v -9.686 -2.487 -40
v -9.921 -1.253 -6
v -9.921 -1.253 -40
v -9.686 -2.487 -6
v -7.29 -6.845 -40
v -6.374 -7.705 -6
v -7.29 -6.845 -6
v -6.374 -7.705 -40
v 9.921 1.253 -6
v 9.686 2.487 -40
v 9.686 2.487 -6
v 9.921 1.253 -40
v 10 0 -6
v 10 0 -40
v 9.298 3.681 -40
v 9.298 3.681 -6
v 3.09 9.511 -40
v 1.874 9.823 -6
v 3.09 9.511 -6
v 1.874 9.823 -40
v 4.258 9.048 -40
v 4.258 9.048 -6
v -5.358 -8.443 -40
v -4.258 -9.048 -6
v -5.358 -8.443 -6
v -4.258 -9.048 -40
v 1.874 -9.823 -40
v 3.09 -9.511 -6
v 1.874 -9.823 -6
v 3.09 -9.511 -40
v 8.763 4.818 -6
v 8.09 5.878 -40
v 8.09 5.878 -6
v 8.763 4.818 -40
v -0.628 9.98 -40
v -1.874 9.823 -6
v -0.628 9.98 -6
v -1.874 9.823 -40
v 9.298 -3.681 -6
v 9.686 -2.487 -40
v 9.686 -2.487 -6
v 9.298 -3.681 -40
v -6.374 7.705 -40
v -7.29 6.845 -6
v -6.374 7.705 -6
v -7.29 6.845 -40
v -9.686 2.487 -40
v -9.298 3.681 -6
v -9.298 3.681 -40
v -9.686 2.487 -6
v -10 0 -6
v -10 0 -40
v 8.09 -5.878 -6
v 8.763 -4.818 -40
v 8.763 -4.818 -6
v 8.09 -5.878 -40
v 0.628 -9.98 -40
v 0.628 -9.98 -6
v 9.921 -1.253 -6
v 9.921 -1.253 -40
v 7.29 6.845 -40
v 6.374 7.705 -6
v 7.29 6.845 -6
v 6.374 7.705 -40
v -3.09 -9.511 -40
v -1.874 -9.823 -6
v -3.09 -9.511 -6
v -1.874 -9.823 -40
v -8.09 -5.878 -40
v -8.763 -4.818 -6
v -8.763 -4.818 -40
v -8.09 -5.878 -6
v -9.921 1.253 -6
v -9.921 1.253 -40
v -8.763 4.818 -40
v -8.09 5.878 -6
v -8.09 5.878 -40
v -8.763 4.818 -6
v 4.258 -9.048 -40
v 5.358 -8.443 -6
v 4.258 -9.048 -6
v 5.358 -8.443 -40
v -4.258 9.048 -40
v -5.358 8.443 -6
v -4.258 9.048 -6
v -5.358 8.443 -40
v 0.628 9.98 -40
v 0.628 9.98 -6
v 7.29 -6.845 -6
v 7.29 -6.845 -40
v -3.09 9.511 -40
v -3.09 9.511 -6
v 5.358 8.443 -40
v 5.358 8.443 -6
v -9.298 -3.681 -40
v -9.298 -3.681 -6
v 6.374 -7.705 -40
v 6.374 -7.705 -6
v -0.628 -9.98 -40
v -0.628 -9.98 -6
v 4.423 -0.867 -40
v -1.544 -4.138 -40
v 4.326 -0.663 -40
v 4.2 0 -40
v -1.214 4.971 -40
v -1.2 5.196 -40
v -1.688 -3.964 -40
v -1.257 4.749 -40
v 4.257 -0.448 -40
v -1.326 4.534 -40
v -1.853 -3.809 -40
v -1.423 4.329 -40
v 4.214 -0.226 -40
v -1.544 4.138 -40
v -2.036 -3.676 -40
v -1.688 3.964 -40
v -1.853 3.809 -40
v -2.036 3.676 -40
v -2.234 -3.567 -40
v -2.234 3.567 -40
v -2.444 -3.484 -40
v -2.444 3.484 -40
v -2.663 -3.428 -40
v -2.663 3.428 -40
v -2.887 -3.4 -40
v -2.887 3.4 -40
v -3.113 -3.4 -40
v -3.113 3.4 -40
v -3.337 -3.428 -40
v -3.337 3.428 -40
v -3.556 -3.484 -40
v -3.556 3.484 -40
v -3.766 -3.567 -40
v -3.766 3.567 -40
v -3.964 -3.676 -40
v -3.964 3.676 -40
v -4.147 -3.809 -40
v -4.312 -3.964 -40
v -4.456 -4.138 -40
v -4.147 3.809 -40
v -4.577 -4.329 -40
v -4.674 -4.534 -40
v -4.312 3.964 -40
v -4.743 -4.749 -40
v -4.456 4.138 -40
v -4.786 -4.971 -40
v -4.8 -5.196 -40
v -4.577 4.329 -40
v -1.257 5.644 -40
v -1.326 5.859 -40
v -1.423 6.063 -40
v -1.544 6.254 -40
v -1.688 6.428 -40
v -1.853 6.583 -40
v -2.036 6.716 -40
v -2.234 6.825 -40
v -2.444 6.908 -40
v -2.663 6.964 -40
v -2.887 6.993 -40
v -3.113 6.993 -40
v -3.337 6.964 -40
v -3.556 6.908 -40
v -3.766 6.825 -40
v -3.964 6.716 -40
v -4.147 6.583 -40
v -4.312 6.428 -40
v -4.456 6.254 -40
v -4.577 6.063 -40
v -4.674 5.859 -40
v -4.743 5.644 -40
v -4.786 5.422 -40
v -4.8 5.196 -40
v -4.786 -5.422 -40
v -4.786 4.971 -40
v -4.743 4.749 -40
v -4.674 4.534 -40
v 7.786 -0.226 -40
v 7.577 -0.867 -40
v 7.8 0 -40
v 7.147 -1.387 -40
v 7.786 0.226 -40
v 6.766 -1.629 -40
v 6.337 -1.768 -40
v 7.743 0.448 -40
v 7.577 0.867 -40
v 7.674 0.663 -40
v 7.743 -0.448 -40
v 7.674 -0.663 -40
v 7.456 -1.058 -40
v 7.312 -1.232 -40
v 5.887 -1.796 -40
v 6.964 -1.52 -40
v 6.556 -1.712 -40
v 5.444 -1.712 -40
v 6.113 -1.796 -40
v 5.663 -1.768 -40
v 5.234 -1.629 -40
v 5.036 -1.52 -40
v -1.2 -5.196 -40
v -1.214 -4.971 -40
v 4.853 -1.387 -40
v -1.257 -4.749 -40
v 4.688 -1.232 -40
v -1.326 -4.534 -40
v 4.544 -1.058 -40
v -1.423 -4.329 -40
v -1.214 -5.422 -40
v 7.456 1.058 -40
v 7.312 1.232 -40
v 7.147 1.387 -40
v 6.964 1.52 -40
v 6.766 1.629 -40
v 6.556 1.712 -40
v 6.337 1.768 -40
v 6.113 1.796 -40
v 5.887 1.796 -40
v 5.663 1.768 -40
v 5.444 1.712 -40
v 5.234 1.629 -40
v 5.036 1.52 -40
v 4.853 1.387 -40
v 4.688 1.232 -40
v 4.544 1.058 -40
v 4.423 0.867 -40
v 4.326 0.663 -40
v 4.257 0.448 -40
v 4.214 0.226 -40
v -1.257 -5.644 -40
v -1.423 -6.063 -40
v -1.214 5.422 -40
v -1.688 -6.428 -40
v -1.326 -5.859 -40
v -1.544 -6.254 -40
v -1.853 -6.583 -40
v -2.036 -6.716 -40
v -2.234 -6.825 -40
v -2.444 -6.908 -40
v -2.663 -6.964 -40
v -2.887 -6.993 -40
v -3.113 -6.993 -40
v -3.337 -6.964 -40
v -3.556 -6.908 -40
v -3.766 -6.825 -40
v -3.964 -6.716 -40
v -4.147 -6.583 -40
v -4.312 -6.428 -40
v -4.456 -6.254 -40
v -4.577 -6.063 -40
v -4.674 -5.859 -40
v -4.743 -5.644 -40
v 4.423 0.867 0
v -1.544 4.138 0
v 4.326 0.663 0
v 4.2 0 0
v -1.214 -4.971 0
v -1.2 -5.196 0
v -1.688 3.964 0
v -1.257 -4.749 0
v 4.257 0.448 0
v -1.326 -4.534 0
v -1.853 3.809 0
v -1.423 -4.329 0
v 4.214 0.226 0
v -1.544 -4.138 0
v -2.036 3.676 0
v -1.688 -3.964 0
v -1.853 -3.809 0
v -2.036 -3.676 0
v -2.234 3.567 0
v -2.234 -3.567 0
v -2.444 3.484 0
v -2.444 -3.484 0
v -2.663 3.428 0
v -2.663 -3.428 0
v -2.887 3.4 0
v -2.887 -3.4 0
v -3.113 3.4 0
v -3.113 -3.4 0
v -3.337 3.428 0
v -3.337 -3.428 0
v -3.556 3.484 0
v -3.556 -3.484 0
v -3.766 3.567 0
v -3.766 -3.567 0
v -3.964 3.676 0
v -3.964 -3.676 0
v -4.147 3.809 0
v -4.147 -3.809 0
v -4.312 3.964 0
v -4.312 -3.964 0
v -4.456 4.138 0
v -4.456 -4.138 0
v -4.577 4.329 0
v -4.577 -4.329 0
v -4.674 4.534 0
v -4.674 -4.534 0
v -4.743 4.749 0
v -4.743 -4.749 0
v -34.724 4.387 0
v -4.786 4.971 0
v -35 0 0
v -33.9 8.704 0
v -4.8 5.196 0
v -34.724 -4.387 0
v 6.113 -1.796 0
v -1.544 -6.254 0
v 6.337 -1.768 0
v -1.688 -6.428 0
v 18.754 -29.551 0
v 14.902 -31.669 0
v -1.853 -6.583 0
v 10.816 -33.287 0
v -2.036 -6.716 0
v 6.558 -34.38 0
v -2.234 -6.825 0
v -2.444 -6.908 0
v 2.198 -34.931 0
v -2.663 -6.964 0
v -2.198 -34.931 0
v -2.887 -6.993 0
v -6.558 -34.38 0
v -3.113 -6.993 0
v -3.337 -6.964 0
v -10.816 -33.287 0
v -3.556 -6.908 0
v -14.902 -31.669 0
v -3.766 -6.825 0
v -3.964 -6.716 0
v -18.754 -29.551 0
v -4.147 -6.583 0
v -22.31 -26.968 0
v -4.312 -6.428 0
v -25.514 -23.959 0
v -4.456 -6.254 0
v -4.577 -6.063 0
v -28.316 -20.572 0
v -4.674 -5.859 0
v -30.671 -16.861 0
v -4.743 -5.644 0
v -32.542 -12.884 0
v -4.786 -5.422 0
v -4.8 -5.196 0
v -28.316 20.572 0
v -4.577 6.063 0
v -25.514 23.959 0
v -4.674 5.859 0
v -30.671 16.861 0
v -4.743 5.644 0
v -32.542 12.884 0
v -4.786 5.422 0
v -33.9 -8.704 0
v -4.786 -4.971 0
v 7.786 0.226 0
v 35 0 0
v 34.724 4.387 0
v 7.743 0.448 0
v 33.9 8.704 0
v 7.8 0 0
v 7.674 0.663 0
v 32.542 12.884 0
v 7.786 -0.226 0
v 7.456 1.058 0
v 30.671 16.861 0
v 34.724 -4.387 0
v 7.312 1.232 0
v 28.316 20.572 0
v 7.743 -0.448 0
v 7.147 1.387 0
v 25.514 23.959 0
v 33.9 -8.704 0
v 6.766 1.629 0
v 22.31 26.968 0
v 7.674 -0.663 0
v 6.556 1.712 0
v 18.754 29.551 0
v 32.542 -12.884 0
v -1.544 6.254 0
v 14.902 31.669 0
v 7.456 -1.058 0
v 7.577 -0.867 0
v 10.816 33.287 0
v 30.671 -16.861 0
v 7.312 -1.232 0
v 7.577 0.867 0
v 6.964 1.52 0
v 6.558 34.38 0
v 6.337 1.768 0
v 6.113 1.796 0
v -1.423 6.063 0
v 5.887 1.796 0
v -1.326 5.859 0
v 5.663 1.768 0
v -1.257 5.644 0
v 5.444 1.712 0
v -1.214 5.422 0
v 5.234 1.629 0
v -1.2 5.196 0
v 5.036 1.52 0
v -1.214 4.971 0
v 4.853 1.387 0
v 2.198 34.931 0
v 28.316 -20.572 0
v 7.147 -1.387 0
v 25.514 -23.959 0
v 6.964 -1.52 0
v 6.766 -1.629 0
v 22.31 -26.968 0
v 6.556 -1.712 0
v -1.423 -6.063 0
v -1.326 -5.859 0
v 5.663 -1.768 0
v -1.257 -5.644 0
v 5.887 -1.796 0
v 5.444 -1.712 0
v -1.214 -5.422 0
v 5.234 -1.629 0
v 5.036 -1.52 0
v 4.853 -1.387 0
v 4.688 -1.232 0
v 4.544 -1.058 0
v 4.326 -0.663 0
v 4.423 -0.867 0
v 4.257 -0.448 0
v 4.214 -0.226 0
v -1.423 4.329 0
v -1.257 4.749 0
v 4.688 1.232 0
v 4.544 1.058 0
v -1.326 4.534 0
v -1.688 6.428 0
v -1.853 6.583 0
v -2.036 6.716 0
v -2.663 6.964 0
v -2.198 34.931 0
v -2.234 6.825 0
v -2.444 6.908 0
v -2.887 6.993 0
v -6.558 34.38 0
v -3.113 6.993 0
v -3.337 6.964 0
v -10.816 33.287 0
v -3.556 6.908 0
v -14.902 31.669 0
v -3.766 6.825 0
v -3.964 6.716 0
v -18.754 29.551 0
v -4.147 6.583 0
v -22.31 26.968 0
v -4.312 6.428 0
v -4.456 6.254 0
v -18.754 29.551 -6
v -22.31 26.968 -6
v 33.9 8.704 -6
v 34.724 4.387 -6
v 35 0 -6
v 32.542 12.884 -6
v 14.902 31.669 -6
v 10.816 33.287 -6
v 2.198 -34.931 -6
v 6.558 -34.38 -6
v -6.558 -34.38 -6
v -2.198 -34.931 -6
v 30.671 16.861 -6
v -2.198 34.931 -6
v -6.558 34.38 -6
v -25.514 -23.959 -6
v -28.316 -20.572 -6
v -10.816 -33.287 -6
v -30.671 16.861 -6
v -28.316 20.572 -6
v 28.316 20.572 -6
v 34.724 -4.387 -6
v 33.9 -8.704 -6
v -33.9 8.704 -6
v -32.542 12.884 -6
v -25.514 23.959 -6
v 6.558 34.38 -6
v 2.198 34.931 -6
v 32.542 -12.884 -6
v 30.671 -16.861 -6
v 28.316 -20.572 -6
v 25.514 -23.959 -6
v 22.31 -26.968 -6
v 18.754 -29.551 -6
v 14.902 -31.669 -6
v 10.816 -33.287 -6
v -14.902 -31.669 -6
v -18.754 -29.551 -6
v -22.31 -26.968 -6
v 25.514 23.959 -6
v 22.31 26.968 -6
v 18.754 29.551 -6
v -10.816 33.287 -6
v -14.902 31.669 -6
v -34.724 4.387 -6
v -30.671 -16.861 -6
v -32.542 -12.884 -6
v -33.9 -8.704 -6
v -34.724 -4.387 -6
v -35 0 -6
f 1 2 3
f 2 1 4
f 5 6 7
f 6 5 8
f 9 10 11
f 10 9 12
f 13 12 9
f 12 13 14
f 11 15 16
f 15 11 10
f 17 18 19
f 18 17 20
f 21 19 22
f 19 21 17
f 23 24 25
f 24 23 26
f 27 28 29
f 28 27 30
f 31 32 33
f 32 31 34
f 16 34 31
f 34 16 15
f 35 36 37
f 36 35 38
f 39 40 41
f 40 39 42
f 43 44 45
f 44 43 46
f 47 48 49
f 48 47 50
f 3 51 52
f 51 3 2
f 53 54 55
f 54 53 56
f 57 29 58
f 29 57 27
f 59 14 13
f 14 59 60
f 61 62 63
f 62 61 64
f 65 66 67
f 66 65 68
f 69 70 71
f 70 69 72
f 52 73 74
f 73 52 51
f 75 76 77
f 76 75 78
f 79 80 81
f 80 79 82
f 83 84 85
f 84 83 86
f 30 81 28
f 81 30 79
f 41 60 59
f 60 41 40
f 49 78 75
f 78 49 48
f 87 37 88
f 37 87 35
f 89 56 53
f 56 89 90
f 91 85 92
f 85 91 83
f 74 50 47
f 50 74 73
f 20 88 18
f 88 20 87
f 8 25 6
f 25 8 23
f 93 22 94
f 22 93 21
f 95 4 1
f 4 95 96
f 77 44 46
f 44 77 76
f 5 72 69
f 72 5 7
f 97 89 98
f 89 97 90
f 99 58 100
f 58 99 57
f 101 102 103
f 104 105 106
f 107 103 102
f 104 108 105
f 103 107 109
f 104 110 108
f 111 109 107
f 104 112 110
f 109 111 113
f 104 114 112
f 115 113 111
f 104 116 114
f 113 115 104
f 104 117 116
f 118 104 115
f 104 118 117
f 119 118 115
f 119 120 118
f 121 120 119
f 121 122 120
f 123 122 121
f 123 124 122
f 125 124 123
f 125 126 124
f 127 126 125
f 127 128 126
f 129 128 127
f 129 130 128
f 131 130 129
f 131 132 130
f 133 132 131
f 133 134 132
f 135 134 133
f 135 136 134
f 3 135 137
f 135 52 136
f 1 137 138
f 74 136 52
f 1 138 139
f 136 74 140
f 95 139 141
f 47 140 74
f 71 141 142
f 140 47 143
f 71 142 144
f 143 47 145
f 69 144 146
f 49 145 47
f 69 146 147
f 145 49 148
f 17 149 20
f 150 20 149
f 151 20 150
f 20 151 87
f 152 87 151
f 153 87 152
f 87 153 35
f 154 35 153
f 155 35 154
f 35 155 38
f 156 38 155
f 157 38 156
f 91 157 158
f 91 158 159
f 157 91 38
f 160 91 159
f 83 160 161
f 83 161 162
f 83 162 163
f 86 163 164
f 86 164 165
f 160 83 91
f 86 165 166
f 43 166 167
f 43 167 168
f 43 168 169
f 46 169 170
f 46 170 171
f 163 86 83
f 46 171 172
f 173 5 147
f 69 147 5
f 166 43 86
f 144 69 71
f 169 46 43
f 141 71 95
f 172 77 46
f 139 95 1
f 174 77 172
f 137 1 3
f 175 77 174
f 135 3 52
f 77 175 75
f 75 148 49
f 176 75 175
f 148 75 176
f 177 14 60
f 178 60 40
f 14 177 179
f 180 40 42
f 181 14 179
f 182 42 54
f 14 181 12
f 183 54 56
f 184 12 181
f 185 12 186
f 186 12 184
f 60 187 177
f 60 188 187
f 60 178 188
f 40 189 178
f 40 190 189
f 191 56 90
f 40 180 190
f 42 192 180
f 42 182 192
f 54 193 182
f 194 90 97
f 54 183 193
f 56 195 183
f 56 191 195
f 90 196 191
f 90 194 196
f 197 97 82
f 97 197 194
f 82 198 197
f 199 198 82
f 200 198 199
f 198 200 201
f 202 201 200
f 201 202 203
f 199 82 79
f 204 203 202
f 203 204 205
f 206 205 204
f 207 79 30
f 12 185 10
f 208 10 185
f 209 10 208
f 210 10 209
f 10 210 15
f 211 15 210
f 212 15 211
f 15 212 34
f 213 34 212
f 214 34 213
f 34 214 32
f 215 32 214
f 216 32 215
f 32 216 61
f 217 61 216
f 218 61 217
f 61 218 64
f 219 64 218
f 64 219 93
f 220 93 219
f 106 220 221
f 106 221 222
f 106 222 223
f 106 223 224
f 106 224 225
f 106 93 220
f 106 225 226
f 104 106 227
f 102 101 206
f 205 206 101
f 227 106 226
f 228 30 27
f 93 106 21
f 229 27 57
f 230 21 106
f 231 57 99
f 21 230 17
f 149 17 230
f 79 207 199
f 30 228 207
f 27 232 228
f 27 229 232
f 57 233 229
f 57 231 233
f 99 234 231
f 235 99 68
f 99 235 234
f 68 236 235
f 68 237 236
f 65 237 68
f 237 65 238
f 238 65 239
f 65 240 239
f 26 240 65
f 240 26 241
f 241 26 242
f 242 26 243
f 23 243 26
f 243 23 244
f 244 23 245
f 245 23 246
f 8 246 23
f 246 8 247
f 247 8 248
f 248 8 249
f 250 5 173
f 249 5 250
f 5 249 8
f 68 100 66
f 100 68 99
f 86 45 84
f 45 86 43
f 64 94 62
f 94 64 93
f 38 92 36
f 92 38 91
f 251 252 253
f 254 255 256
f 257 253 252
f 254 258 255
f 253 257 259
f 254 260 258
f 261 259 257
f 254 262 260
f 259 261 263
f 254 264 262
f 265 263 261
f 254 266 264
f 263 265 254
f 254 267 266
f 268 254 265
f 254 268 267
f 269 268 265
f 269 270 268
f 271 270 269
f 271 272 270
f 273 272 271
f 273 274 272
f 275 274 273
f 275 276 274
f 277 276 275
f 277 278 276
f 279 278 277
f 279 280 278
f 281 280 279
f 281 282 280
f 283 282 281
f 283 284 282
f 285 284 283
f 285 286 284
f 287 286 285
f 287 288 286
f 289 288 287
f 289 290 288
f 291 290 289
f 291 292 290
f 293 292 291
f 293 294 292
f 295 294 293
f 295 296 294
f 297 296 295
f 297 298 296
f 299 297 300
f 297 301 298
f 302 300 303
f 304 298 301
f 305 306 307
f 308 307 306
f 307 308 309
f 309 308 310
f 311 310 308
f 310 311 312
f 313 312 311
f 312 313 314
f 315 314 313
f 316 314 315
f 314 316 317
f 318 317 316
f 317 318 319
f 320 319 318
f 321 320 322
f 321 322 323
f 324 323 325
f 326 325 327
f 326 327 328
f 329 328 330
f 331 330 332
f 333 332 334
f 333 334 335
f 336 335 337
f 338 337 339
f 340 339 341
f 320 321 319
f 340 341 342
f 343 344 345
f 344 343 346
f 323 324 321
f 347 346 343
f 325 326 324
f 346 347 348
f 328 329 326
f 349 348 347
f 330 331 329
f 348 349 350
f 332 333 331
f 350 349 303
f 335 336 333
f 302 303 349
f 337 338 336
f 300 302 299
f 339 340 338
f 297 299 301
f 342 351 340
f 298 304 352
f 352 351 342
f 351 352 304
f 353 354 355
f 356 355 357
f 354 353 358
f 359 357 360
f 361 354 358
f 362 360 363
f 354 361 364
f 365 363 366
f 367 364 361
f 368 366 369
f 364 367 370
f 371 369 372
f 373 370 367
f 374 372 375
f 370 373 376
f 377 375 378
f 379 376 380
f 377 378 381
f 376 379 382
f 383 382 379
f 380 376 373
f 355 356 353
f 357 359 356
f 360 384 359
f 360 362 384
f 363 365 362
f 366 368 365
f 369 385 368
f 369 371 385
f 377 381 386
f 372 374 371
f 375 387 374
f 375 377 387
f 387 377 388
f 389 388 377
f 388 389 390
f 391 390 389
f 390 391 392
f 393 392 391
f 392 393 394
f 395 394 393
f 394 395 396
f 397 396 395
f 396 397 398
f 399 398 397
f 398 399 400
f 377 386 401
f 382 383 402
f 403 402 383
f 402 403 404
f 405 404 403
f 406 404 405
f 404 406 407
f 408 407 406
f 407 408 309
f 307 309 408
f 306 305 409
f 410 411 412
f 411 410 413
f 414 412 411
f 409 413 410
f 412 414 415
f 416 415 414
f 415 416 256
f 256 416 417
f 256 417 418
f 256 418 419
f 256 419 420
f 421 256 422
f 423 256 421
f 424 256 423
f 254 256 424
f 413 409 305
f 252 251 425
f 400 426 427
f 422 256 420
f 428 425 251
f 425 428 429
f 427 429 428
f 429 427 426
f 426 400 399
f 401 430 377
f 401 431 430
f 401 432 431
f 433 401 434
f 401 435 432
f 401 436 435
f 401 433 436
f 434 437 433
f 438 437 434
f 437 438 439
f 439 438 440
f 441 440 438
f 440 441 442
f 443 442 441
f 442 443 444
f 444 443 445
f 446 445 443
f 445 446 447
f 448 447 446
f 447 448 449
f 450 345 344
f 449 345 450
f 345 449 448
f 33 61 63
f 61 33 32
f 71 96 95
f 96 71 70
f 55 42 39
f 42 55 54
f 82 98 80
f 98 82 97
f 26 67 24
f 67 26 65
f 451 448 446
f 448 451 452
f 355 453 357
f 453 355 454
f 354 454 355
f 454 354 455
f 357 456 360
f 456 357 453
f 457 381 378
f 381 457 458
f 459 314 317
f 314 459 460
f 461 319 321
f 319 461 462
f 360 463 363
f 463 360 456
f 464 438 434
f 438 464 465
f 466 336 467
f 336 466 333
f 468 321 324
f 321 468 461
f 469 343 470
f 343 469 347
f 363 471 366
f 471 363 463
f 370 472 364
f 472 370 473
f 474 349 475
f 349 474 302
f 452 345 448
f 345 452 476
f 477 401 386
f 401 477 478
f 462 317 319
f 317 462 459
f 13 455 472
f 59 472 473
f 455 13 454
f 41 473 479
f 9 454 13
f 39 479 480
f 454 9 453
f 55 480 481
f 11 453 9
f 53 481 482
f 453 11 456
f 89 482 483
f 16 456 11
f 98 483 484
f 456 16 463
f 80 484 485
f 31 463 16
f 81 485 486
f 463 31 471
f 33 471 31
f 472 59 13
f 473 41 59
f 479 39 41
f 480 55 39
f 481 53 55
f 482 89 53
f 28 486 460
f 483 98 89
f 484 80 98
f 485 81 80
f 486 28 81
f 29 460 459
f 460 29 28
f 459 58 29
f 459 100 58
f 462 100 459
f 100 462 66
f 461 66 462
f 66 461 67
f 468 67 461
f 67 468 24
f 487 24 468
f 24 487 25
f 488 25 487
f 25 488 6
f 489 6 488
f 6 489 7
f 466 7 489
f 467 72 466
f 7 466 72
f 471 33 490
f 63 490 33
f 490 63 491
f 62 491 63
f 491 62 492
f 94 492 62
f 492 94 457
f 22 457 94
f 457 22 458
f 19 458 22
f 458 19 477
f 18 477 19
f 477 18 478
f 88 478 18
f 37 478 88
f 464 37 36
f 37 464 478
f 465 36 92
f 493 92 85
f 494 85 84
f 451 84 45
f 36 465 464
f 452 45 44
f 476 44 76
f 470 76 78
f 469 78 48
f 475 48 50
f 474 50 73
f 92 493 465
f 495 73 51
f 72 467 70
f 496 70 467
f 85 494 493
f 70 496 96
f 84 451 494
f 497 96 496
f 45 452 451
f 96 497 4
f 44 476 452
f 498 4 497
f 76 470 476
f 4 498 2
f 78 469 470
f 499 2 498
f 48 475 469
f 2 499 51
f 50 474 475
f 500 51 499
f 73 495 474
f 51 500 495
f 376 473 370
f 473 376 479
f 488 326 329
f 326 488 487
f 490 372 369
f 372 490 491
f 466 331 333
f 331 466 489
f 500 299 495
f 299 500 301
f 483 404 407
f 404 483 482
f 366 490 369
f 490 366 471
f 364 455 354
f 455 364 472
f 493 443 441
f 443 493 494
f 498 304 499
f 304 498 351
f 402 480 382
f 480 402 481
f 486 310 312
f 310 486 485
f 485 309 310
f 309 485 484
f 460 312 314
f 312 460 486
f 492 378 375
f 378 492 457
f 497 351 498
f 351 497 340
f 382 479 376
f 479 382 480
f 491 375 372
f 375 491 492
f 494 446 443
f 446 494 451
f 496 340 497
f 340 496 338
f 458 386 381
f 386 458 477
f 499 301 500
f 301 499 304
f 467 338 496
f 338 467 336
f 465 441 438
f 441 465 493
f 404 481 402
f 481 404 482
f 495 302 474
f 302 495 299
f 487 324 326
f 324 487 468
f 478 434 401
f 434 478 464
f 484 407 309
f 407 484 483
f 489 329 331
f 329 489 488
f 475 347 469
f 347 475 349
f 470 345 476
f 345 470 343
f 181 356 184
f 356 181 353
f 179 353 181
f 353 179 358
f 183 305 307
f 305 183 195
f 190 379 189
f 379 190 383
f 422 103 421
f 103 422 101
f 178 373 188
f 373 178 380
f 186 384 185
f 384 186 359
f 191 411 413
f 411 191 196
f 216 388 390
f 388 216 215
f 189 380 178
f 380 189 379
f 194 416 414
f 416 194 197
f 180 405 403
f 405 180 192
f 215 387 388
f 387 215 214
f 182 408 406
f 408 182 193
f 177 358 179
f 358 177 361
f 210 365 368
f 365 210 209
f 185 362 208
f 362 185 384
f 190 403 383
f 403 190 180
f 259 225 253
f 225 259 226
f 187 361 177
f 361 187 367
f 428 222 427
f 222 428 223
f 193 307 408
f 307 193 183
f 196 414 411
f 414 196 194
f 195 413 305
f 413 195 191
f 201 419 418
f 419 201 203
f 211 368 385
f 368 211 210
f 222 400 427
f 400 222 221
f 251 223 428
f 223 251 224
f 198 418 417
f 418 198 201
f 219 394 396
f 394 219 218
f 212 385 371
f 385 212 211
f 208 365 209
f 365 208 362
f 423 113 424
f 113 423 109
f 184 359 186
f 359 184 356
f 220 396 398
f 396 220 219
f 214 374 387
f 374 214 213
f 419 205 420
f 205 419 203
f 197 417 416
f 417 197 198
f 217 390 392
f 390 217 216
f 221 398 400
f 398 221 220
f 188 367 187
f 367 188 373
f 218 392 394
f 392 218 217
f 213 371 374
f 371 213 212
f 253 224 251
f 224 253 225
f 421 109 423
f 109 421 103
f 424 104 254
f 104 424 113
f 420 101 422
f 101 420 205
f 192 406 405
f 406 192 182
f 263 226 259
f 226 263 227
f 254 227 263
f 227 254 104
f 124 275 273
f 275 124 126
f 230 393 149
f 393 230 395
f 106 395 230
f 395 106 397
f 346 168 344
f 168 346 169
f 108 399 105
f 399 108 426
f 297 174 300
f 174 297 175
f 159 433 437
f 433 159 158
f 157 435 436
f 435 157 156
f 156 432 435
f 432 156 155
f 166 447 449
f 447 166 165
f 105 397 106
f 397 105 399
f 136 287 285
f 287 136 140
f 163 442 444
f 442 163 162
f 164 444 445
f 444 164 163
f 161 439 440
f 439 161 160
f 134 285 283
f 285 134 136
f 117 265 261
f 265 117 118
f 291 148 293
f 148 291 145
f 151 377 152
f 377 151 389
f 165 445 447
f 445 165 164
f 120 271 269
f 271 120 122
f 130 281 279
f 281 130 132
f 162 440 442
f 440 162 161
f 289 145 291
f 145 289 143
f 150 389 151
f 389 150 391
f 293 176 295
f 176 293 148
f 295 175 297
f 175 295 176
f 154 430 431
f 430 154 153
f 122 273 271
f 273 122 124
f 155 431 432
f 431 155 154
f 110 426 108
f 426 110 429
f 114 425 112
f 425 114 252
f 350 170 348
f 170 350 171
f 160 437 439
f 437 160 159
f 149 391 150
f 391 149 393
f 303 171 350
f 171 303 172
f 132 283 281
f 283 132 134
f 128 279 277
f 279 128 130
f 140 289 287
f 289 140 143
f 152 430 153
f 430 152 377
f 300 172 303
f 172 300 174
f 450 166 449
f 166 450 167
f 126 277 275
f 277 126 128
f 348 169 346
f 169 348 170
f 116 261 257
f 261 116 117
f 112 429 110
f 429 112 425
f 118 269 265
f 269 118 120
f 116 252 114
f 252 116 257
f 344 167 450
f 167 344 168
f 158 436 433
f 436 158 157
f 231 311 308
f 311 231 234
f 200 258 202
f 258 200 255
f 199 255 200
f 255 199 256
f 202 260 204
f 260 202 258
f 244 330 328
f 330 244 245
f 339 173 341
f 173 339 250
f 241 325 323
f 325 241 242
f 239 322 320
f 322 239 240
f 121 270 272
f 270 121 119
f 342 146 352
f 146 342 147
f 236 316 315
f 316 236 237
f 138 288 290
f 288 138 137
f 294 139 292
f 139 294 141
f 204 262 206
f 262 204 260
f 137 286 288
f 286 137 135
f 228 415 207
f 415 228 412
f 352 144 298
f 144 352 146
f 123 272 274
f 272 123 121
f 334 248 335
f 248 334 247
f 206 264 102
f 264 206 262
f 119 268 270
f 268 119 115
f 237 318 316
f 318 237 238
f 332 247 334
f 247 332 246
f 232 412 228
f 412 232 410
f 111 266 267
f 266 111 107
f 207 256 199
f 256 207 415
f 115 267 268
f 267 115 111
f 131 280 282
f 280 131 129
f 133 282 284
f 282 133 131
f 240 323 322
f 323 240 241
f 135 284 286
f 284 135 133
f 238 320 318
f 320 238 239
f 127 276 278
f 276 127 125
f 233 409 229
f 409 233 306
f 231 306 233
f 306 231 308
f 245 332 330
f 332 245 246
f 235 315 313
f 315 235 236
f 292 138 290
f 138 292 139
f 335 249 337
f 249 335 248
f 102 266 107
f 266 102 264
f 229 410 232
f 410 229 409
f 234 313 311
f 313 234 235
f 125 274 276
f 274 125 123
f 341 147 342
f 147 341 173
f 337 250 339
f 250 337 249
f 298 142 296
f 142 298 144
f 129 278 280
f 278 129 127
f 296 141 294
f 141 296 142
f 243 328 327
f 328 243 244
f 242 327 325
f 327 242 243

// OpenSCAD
$fn = 50;


difference() {
	union() {
		translate(v = [0, 0, -40.0000000000]) {
			cylinder(h = 40, r = 10.0000000000);
		}
		translate(v = [0, 0, -6.0000000000]) {
			cylinder(h = 6, r = 35.0000000000);
		}
	}
	union() {
		#translate(v = [6.0000000000, 0.0000000000, -40]) {
			cylinder(h = 40, r = 1.8000000000);
		}
		#translate(v = [-3.0000000000, 5.1961524227, -40]) {
			cylinder(h = 40, r = 1.8000000000);
		}
		#translate(v = [-3.0000000000, -5.1961524227, -40]) {
			cylinder(h = 40, r = 1.8000000000);
		}
	}
}
